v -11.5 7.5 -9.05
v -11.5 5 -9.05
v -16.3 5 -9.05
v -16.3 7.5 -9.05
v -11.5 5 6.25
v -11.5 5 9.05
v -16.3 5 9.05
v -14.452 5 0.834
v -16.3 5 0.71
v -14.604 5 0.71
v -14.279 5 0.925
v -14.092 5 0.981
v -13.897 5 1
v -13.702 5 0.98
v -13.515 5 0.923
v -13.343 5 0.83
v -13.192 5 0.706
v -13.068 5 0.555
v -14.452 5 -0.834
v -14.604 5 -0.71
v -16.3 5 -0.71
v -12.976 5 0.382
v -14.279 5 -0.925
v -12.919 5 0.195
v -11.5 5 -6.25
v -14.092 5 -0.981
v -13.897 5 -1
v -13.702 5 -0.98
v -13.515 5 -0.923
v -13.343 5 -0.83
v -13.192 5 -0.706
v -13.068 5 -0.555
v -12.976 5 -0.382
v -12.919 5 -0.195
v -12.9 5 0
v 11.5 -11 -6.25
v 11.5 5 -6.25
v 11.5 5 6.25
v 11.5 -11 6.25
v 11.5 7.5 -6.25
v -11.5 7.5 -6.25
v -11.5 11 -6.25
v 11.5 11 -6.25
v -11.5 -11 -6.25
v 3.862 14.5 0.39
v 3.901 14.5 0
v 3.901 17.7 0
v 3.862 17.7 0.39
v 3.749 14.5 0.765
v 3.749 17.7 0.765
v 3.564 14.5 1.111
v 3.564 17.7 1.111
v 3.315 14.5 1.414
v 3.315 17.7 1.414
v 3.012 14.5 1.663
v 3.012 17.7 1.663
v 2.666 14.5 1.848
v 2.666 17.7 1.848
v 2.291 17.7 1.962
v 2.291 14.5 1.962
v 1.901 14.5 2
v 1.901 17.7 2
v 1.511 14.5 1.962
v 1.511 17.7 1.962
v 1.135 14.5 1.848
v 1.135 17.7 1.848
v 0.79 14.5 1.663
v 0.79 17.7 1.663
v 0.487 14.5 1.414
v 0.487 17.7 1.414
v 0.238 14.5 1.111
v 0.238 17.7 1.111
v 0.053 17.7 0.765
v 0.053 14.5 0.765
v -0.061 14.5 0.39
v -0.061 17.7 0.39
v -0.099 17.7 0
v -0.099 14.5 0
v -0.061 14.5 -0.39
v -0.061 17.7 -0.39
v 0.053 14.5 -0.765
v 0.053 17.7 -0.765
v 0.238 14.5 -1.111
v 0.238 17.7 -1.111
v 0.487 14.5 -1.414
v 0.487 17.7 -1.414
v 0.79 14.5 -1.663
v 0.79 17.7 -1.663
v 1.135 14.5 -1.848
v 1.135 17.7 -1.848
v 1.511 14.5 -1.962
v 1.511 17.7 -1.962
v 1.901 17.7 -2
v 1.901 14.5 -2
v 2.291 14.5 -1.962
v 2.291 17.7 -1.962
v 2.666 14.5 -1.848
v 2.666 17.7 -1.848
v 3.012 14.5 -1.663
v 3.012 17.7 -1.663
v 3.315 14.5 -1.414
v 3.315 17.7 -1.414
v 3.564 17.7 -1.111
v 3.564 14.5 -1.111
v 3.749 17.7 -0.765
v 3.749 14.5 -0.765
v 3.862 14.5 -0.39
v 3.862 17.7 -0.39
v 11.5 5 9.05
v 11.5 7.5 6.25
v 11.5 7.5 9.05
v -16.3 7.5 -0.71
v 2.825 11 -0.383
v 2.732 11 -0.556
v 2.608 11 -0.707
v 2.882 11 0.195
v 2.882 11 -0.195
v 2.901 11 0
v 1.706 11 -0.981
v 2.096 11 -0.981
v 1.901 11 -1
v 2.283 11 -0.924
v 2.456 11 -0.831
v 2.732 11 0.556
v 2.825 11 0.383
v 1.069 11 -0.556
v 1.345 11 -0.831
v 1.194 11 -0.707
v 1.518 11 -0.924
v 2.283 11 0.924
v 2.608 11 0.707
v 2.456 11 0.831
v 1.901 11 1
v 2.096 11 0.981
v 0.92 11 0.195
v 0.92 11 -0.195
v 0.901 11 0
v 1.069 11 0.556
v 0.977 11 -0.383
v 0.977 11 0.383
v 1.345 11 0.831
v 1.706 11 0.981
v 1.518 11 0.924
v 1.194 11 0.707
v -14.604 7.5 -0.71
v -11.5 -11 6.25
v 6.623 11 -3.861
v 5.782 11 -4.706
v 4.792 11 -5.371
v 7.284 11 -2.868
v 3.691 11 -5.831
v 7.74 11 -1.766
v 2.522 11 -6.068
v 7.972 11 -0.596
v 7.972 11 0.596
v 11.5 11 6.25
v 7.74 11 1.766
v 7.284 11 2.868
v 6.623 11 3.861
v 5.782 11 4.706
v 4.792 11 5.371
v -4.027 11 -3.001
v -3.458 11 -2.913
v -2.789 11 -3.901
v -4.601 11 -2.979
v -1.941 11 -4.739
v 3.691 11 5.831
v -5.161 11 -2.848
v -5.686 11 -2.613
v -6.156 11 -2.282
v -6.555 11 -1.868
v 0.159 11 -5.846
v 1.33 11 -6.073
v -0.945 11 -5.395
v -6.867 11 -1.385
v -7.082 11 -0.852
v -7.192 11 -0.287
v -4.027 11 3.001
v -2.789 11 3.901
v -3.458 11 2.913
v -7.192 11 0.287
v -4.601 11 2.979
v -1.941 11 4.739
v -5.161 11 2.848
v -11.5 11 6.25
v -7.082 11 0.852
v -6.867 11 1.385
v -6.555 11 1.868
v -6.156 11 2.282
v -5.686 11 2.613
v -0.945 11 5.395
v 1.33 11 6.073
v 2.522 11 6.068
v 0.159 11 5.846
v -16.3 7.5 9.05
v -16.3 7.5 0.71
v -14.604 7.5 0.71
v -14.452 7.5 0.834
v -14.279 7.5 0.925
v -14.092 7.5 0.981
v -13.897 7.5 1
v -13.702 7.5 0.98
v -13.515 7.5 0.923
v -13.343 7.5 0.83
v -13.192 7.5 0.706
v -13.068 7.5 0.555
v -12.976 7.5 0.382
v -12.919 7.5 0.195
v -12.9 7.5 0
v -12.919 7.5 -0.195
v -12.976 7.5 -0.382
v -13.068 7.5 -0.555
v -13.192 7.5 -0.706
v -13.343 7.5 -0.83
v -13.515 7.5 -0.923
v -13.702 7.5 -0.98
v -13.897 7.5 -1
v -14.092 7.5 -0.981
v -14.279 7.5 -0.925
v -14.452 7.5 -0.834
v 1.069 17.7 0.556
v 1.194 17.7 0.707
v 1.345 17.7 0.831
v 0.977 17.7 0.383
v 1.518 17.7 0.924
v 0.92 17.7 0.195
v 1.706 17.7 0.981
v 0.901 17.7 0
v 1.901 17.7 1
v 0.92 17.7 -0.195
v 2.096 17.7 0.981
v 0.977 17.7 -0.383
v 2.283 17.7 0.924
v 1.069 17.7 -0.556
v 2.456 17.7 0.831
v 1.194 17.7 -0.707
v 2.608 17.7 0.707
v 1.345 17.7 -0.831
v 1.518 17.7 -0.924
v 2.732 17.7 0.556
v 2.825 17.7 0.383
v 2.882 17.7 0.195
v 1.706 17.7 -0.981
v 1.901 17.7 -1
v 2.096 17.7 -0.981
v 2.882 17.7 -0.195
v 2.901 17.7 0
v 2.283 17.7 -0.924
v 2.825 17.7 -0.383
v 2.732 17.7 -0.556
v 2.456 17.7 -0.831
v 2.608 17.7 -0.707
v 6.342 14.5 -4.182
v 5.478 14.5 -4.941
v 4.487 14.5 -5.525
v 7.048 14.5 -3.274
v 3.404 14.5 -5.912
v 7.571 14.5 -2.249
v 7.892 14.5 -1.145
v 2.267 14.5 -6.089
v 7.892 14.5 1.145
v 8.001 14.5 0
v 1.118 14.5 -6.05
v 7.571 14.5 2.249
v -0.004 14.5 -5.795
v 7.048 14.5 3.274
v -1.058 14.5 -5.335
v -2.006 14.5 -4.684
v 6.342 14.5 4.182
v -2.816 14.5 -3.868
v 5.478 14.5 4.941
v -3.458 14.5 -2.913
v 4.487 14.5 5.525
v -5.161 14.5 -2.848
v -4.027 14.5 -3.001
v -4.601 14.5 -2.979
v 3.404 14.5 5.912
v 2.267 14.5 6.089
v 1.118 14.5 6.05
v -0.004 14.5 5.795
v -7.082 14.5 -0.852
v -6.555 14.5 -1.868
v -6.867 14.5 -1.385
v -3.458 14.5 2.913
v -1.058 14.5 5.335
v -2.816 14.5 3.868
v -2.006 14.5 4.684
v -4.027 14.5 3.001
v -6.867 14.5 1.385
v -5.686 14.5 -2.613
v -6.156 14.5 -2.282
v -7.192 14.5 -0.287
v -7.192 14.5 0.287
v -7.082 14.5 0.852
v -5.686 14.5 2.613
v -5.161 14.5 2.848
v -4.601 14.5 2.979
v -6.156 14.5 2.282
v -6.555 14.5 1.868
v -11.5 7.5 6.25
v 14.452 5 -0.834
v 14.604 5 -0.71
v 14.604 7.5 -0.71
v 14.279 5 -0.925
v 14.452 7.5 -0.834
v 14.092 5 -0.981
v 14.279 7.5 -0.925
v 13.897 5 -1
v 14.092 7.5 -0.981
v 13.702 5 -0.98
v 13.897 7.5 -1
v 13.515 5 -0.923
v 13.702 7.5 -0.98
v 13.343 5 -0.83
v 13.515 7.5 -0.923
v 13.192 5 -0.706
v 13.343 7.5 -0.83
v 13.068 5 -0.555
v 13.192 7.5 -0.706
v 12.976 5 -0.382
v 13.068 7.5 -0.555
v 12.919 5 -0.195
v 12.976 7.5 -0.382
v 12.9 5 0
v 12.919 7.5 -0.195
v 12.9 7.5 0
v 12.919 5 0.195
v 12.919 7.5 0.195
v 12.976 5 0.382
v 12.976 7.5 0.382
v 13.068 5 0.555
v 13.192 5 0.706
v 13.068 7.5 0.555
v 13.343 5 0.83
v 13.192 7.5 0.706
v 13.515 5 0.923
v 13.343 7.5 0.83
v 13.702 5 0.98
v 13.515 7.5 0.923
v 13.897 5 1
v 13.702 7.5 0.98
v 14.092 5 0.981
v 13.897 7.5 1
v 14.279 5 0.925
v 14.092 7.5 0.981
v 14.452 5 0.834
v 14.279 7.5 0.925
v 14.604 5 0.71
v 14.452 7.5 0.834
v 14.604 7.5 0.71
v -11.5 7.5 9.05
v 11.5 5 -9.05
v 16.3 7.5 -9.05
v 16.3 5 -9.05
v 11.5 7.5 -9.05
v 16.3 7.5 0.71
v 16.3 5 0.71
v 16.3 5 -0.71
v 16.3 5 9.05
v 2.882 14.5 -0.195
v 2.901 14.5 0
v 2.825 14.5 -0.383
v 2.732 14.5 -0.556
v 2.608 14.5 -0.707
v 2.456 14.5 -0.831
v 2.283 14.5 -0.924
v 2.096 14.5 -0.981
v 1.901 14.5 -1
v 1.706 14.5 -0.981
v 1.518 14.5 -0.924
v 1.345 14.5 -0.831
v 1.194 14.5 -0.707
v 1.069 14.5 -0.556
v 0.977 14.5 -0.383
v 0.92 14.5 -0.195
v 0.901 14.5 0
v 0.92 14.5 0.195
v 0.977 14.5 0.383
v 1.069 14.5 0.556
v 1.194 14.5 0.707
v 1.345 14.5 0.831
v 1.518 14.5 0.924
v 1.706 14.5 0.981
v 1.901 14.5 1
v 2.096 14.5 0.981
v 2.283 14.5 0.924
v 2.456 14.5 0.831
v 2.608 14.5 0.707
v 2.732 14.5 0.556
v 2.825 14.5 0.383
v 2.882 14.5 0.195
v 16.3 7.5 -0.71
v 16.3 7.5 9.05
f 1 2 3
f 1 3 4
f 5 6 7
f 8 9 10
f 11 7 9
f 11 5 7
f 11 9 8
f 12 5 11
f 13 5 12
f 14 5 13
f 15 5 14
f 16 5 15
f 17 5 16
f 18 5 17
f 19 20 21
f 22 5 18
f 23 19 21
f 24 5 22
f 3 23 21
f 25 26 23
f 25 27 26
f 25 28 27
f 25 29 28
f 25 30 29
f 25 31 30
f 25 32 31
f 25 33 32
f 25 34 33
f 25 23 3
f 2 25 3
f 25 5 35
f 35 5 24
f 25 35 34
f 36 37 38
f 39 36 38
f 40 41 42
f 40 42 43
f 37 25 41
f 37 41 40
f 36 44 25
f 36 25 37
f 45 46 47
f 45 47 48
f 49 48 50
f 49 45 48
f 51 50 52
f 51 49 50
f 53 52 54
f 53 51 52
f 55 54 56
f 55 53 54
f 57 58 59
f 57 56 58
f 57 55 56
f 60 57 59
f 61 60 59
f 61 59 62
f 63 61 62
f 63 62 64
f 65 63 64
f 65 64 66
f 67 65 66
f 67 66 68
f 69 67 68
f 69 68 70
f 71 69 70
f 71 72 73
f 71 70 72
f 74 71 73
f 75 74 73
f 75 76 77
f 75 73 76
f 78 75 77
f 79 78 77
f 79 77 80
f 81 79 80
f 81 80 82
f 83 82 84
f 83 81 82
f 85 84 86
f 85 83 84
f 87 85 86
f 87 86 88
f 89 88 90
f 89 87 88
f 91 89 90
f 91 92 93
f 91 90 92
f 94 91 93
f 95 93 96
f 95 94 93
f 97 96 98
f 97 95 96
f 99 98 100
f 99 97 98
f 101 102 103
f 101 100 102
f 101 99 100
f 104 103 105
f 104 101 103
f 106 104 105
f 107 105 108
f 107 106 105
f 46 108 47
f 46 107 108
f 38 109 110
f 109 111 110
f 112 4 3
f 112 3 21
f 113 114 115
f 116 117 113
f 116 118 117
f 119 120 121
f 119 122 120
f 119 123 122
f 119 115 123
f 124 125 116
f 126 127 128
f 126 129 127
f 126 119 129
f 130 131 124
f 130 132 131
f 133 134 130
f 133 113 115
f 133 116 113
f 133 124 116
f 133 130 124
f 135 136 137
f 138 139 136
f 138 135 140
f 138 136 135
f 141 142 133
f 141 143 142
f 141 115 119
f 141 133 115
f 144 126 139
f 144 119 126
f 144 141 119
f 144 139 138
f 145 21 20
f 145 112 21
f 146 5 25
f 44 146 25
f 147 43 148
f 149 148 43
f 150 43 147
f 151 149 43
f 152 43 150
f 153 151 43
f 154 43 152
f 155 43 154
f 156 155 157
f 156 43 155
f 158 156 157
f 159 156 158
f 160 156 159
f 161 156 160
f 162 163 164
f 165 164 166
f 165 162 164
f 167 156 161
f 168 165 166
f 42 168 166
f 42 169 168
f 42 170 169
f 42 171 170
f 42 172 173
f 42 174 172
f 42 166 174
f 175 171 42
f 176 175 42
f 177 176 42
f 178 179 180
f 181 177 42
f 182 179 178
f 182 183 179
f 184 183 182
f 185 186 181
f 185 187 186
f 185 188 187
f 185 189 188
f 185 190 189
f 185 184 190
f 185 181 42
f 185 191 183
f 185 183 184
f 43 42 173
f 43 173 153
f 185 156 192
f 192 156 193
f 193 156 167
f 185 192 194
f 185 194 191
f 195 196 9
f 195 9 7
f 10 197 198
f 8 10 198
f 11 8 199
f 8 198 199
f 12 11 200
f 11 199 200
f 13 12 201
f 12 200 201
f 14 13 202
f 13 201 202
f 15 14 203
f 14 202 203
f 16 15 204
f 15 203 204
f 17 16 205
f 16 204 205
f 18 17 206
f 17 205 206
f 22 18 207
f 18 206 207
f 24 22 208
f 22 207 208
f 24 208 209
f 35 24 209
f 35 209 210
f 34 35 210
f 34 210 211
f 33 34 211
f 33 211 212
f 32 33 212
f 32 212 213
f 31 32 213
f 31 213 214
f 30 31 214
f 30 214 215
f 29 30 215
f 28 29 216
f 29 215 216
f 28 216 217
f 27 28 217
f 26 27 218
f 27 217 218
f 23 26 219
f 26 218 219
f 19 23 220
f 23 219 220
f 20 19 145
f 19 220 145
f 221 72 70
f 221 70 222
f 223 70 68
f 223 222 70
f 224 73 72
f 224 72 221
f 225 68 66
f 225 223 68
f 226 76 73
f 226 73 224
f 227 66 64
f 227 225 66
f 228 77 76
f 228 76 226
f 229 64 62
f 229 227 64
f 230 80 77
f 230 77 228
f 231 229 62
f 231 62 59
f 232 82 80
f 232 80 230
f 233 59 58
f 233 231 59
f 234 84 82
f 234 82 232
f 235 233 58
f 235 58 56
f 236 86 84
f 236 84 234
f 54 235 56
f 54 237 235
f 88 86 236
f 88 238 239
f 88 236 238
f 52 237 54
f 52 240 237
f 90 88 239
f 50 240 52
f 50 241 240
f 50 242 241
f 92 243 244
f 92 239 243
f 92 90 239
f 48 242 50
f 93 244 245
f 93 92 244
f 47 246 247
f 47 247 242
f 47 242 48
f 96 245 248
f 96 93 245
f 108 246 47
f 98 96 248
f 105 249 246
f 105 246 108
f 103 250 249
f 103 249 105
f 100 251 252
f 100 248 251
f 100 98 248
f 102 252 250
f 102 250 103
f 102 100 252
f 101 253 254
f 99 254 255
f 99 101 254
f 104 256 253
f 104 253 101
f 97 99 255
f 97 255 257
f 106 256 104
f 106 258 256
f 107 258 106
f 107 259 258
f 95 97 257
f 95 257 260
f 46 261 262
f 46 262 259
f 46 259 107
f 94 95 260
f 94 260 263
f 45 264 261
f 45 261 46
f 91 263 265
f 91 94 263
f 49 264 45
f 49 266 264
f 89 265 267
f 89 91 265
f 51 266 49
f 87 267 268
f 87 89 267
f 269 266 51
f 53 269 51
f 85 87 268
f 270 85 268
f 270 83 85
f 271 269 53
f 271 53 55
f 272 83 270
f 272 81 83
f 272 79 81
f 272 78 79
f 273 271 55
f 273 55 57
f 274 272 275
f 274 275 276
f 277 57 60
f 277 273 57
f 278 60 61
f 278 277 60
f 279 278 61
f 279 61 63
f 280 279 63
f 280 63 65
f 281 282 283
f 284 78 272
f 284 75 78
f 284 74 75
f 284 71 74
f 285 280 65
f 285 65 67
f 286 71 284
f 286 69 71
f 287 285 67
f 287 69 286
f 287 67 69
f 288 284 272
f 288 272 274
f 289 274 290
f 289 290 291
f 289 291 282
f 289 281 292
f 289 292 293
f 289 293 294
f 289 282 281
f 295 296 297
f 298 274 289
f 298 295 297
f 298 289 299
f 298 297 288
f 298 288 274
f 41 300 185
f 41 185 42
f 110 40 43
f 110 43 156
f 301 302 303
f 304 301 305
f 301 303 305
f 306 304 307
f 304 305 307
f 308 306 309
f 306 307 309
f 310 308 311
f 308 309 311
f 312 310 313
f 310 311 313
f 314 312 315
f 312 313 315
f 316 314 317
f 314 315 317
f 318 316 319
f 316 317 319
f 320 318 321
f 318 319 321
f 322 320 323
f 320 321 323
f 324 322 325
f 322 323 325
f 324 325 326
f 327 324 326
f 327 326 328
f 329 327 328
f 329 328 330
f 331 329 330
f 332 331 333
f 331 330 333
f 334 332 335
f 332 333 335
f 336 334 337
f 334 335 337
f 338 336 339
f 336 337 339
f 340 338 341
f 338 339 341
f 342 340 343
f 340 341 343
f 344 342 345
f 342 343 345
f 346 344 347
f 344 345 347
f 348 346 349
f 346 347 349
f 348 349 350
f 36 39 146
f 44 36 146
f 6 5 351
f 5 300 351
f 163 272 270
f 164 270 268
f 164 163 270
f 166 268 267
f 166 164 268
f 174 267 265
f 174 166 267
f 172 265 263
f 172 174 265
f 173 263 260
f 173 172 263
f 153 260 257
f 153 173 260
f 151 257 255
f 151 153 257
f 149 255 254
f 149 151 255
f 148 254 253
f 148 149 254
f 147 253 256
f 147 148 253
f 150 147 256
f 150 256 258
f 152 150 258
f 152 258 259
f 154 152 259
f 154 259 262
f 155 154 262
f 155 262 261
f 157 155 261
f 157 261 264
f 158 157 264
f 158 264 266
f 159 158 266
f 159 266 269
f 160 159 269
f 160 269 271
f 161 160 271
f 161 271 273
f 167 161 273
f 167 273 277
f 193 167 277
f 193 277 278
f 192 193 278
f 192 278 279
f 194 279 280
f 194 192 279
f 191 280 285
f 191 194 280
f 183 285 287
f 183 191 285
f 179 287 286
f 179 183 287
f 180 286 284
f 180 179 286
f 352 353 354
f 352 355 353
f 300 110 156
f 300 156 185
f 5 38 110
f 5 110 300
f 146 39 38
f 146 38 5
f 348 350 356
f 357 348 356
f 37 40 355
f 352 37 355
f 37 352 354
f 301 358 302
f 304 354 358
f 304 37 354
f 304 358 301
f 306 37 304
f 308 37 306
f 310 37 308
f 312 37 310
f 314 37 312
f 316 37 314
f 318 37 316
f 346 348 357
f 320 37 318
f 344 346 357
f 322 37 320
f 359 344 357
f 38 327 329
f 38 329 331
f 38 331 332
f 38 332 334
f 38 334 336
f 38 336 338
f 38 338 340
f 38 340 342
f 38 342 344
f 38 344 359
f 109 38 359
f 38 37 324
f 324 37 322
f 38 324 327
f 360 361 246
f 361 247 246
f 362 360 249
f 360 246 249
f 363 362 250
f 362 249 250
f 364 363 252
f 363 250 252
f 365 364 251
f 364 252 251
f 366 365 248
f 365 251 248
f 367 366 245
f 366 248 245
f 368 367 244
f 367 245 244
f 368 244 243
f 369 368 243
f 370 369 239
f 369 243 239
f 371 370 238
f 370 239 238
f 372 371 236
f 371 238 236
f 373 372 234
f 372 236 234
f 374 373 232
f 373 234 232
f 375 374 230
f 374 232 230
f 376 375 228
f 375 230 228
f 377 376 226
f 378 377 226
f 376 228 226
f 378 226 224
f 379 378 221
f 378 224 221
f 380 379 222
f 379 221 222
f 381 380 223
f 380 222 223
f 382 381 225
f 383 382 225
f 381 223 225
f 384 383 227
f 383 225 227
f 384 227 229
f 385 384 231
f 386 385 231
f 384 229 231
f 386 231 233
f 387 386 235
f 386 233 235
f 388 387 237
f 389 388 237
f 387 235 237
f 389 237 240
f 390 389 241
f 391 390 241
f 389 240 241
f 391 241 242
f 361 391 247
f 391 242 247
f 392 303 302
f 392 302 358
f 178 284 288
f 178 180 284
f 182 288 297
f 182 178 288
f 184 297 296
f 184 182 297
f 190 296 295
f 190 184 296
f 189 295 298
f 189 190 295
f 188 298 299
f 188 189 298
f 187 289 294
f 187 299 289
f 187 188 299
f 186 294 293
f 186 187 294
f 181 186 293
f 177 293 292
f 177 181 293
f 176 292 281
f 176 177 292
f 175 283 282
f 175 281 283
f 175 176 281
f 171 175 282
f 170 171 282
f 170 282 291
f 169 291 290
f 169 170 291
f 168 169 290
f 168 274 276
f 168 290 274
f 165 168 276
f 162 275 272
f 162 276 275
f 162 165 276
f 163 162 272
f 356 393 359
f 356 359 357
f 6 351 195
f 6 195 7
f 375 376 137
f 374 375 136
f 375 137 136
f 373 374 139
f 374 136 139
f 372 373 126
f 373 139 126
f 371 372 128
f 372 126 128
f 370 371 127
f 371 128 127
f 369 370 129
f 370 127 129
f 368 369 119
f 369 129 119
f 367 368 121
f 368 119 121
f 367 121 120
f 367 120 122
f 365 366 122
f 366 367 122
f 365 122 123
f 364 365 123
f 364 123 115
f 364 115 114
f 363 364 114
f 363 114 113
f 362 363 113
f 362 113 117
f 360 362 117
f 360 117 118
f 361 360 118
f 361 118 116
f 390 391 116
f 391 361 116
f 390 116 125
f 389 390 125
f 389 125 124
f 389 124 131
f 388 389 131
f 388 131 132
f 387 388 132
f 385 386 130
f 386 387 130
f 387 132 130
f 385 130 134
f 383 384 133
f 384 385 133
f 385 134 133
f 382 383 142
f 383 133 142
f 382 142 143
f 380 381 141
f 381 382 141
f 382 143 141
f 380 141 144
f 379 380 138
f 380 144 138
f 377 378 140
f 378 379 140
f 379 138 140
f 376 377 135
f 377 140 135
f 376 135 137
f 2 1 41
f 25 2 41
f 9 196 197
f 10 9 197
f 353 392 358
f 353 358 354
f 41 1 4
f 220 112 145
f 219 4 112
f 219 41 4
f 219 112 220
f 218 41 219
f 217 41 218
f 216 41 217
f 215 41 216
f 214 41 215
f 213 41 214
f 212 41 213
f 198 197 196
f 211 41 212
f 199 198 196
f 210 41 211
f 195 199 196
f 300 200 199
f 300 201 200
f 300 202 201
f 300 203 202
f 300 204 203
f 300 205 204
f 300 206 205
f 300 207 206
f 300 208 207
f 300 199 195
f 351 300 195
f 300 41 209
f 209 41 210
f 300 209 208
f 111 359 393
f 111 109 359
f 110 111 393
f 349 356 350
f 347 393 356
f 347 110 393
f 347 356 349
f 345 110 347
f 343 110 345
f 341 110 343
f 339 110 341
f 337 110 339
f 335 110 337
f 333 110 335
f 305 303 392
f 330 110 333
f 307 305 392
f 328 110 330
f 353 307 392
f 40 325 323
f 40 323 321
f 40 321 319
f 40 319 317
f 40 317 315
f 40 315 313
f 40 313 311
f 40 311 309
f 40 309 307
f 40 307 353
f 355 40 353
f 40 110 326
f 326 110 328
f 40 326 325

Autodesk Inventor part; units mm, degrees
sketch "Sketch1" plane through (0, 0, 0) normal (0, 1, 0) x (-1, 0, 0)
  line L0 (11.5, -6.25) -> (-11.5, -6.25)
  line L1 (-11.5, -6.25) -> (-11.5, 6.25)
  line L2 (-11.5, 6.25) -> (11.5, 6.25)
  line L3 (11.5, 6.25) -> (11.5, -6.25)
  line L4 (11.5, -6.25) -> (-11.5, 6.25) construction
  line L5 (-11.5, -6.25) -> (11.5, 6.25) construction
  point P0 (0, 0)
  dimension "d0" = 23
  dimension "d1" = 12.5
extrude "Extrusion1" add sketch "Sketch1" along normal mid plane 22
ref_plane "Work Plane3" through (-11.5, 0, 0) normal (1, 0, 0) x (0, 1, 0)
ref_plane "Work Plane2" through (11.5, 0, 0) normal (1, 0, 0) x (0, 1, 0)
ref_plane "Work Plane4" through (0, 5, 0) normal (0, 1, 0) x (-1, 0, 0)
ref_plane "Work Plane5" through (0, 0, 6.25) normal (0, 0, 1) x (1, 0, 0)
sketch "Sketch2" plane through (11.5, -11, -6.25) normal (1, 0, 0) x (0, 0, -1)
  line L0 (0, 0) -> (-12.5, 0) projected
  line L1 (-12.5, 0) -> (-12.5, 16)
  line L2 (-12.5, 0) -> (-12.5, 22) projected
  line L3 (-12.5, 16) -> (-15.3, 16)
  line L4 (-15.3, 16) -> (-15.3, 18.5)
  line L5 (-15.3, 18.5) -> (0, 18.5)
  line L6 (0, 18.5) -> (2.8, 18.5)
  line L7 (2.8, 18.5) -> (2.8, 16)
  line L8 (2.8, 16) -> (-12.5, 16)
  point P0 (-6.25, 11)
  dimension "d8" = 16
  dimension "d9" = 2.8
  dimension "d10" = 2.5
  dimension "d11" = 2.8
extrude "Extrusion2" add sketch "Sketch2" along normal blind 4.8
mirror "Mirror1" about plane through (0, 0, 0) normal (1, 0, 0) of "Extrusion2"
ref_plane "Work Plane6" through (0, 11, 0) normal (0, 1, 0) x (-1, 0, 0)
sketch "Sketch3" plane through (0, 11, 0) normal (0, 1, 0) x (-1, 0, 0)
  line L0 (-12.5008, 0) -> (-1.9008, 0)
  arc A0 (3.4585, 2.9134) -> (3.4585, -2.9134) centre (-1.9008, 0) ccw
  circle A1 centre (-1.9008, 0) radius 1
  arc A2 (3.4585, -2.9134) -> (3.4585, 2.9134) centre (4.1992, 0) ccw
  point P0 (0, 0)
  dimension "d15" = 10.6
  dimension "d16" = 12.2
  dimension "d17" = 2
extrude "Extrusion3" add sketch "Sketch3" along normal blind 3.5
sketch "Sketch4" plane through (0, 14.5, 0) normal (0, 1, 0) x (1, 0, 0)
  circle A0 centre (1.9008, 0) radius 1 projected
  circle A1 centre (1.9008, 0) radius 2
  point P0 (0, 0)
  dimension "d20" = 4
extrude "Extrusion4" add sketch "Sketch4" along normal blind 3.2 contours A0 | A1
sketch "Sketch5" plane through (1.9008, 17.7, 0) normal (0, 1, 0) x (1, 0, 0)
  circle A0 centre (0, 0) radius 1 projected
  circle A1 centre (0, 0) radius 1
  point P0 (-1.9008, 0)
extrude "Extrusion5" cut sketch "Sketch5" against normal blind 3.2
sketch "Sketch6" plane through (11.5, 7.5, -6.25) normal (0, 1, 0) x (1, 0, 0)
  circle A0 centre (-9.5992, -6.25) radius 1 projected
  line L0 (-9.5992, -6.25) -> (1.4, -6.25)
  line L1 (4.8, -15.3) -> (4.8, 2.8) projected
  line L2 (0, -12.5) -> (0, 0) projected
  line L3 (0, -6.25) -> (4.8, -6.25)
  arc A1 (3.1037, -5.5395) -> (3.1037, -6.9605) centre (2.4, -6.25) ccw
  line L4 (2.4, -5.25) -> (2.4, -5.25)
  line L5 (3.1037, -5.5395) -> (4.8, -5.5395)
  line L6 (3.1037, -6.9605) -> (4.8, -6.9605)
  line L7 (4.8, -6.9605) -> (4.8, -5.5395)
  point P0 (-11.5, -6.25)
  dimension "d25" = 2
extrude "Extrusion6" cut sketch "Sketch6" against normal blind 2.5 contours A1 L5 L1 L3 | L3 L1 L6 A1
mirror "Mirror2" about plane through (0, 0, 0) normal (1, 0, 0) of "Extrusion6"
